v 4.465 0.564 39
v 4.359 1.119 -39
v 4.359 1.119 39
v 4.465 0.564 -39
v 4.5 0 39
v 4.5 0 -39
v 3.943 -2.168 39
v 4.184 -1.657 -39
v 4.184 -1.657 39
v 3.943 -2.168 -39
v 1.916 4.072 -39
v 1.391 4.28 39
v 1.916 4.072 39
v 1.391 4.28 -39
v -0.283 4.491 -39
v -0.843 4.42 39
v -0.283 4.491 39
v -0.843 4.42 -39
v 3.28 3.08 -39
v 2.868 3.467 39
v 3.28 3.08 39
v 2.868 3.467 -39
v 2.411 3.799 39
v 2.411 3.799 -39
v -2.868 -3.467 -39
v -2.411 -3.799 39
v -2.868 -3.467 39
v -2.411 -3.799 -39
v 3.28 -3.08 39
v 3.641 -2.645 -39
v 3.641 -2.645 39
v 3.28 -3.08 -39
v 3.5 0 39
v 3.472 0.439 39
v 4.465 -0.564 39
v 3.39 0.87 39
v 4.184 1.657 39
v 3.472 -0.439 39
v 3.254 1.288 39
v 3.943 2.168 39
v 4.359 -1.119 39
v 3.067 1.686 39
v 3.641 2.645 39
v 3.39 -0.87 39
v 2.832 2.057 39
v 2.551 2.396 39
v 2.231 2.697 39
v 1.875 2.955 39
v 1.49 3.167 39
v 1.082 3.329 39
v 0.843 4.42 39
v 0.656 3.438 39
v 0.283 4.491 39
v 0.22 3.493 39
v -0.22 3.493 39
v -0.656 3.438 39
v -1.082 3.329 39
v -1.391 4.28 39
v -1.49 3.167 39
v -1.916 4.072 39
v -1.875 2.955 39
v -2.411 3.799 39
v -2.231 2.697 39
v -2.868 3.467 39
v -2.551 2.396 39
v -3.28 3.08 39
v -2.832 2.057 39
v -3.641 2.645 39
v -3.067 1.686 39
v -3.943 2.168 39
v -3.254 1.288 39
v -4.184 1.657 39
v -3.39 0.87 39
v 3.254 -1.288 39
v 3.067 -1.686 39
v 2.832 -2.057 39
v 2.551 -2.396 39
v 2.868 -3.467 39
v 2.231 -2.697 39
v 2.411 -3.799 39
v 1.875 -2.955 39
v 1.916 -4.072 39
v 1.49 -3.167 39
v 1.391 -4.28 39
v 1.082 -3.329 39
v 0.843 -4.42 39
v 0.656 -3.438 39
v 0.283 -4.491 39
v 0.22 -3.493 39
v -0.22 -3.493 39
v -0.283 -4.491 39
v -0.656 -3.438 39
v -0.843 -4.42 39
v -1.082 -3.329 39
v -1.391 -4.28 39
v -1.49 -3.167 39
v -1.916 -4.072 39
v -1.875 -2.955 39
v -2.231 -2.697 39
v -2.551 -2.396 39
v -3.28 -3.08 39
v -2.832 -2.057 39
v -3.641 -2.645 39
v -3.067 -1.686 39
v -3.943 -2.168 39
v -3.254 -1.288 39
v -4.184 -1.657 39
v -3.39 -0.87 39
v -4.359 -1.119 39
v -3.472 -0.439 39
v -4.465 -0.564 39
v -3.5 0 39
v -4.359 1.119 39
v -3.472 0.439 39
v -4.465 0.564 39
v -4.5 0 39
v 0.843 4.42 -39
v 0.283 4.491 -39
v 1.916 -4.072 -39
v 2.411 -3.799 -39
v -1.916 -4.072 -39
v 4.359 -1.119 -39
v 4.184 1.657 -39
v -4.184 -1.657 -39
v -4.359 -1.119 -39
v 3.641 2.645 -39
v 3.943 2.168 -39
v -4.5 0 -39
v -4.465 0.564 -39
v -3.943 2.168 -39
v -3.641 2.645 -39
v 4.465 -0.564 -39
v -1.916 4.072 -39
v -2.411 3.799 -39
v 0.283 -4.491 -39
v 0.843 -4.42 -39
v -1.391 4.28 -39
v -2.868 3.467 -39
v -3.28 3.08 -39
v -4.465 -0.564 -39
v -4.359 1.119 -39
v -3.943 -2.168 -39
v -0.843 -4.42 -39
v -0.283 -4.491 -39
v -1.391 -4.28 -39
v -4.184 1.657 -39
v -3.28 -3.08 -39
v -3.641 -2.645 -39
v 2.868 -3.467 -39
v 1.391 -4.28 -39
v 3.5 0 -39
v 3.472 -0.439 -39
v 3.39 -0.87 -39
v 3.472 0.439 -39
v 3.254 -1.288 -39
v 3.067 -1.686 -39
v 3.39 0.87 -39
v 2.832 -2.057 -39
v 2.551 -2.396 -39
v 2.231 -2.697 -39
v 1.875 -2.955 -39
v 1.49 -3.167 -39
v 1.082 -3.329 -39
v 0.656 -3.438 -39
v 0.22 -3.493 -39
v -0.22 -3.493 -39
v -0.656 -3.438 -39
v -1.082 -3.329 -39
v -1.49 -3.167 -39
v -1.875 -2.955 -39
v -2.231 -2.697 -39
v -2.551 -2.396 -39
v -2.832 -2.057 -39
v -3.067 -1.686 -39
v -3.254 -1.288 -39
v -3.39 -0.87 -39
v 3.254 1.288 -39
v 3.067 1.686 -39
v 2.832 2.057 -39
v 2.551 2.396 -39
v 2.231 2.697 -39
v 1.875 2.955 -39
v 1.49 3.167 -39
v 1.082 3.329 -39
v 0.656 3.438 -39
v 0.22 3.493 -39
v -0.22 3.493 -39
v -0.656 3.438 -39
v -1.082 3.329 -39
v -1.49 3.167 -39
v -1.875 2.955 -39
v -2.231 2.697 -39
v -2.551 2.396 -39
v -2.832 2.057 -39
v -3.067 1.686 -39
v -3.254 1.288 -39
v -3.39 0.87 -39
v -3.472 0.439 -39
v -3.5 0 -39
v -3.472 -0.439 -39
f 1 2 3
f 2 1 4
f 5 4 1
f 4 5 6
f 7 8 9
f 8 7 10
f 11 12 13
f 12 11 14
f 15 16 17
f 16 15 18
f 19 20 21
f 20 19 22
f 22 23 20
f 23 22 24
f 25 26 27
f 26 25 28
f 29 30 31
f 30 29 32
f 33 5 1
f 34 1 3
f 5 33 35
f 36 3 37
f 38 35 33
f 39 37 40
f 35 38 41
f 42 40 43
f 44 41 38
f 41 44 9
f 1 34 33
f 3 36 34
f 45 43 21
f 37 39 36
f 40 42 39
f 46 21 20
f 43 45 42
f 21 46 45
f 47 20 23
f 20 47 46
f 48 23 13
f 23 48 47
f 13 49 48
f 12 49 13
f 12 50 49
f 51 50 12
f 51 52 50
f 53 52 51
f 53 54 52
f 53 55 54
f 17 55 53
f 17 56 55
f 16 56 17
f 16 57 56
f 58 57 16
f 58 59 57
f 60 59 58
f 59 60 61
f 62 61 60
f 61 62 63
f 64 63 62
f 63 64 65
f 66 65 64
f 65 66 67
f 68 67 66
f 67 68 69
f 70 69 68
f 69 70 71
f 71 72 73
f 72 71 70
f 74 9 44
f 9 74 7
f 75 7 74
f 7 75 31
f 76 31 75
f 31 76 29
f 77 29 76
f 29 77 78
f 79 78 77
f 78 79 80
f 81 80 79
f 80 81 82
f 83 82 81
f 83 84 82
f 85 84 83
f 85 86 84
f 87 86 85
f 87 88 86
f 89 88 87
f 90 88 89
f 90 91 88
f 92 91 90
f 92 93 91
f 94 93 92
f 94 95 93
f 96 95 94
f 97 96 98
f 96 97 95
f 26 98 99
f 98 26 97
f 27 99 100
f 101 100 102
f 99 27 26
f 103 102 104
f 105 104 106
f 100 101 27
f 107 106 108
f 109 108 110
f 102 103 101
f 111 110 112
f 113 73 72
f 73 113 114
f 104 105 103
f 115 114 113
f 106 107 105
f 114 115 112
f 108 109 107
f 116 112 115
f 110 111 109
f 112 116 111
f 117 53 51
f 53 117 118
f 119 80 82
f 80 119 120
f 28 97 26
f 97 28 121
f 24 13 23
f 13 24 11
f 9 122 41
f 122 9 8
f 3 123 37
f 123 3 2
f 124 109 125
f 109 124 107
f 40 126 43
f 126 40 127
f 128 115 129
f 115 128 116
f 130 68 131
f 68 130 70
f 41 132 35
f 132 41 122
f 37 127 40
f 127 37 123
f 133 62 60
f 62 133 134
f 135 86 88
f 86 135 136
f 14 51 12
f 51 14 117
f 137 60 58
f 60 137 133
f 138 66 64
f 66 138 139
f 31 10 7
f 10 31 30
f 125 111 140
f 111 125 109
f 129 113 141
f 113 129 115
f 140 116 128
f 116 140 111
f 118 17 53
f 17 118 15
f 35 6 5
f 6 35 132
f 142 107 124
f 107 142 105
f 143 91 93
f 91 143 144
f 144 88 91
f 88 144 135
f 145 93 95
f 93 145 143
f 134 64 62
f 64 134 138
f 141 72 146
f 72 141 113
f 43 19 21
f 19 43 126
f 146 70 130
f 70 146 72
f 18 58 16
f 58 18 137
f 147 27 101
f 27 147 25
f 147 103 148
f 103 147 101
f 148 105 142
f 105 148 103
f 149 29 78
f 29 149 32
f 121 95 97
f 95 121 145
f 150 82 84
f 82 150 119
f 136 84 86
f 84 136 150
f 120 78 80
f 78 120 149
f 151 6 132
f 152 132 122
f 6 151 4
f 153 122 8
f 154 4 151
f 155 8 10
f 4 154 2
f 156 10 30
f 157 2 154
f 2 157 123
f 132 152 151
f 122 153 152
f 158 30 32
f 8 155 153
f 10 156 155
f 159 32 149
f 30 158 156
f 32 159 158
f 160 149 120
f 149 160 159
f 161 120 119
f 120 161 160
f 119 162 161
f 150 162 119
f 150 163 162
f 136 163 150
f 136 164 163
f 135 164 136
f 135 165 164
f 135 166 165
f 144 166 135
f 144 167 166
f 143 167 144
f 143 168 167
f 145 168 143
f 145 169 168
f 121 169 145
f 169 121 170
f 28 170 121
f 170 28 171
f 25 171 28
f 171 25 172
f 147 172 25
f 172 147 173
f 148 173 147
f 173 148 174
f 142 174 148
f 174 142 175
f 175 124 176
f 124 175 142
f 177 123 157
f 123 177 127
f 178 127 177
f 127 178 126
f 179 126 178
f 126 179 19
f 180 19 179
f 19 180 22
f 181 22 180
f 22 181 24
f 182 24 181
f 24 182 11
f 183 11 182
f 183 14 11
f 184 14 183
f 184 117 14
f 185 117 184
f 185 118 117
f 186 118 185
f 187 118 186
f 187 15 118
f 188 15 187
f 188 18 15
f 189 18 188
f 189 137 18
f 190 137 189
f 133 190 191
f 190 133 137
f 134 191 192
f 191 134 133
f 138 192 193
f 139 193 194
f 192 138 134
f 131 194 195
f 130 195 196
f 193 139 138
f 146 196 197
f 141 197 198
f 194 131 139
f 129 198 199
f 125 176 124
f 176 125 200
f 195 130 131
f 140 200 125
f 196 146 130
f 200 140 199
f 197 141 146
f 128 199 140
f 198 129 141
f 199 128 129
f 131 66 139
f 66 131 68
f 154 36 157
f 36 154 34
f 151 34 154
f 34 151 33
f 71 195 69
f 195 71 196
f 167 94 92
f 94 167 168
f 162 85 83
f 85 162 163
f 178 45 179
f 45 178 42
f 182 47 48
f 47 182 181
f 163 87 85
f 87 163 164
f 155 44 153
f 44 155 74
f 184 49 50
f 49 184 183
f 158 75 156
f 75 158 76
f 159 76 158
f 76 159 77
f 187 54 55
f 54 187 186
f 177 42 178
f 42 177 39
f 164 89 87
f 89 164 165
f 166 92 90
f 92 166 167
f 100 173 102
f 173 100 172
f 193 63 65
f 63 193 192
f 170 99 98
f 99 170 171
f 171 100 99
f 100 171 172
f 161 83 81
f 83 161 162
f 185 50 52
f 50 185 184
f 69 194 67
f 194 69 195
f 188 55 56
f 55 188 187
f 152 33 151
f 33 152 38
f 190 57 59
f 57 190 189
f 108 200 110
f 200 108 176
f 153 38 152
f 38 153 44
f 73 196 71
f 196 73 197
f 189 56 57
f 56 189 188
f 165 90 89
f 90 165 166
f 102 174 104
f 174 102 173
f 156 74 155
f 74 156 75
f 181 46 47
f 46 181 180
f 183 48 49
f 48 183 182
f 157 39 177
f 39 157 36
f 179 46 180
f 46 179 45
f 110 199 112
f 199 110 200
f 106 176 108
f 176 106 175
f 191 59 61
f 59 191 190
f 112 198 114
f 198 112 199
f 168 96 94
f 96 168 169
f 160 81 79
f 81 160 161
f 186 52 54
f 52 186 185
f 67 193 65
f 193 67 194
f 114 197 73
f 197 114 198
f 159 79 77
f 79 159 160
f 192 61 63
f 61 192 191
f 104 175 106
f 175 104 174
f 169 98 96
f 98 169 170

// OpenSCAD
$fn = 50;


difference() {
	union() {
		translate(v = [0, 0, -39.0000000000]) {
			cylinder(h = 78, r = 4.5000000000);
		}
	}
	union() {
		translate(v = [0, 0, -100.0000000000]) {
			cylinder(h = 200, r = 3.5000000000);
		}
	}
}
